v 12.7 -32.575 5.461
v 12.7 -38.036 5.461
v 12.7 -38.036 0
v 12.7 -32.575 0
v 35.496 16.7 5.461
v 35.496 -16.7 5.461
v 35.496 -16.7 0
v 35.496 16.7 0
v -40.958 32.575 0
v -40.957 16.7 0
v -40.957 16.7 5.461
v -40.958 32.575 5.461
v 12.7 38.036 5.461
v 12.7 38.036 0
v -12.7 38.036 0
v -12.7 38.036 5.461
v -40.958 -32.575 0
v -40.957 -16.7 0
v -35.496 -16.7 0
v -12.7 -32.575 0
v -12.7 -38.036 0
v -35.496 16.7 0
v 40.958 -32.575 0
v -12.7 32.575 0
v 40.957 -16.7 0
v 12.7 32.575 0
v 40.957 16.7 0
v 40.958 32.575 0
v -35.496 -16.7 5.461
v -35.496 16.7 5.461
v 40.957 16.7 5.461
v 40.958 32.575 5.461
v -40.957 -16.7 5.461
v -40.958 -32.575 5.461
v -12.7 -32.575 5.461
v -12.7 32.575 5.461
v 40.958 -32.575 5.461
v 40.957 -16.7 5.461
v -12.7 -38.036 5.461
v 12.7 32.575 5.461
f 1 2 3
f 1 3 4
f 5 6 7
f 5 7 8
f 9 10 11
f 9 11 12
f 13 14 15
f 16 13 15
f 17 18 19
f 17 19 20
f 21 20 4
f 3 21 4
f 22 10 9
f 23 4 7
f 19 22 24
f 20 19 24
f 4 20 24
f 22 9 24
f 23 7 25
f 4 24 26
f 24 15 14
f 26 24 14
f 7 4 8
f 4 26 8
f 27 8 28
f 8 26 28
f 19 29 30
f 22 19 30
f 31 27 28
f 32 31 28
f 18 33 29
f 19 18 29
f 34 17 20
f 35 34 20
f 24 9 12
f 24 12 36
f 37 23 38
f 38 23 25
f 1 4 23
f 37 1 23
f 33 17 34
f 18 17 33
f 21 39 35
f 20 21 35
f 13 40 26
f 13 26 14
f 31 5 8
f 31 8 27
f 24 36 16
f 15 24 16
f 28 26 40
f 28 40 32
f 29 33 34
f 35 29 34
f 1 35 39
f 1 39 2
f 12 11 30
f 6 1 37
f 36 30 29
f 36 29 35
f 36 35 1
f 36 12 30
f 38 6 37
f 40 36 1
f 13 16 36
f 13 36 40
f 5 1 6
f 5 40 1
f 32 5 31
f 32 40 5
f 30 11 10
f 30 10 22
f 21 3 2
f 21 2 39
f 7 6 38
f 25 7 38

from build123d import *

# Parameters (mm, degrees)
SKETCH1_W           = 81.915
SKETCH1_H           = 65.151
BOSS_EXTRUDE1_DEPTH = 5.461
SKETCH2_W           = 5.461
SKETCH2_H           = 33.401
CUT_EXTRUDE1_DEPTH  = 6.461
SKETCH5_W           = 25.4
SKETCH5_H           = 5.461
BOSS_EXTRUDE2_DEPTH = 5.461


with BuildPart() as part:
    # Sketch1 → Boss-Extrude1 (new body)
    with BuildSketch(Plane.XY):
        Rectangle(SKETCH1_W, SKETCH1_H)
    extrude(amount=BOSS_EXTRUDE1_DEPTH)

    # Sketch2 → Cut-Extrude1 (cut, through all)
    with BuildSketch(Plane.XY.offset(5.461)):
        with Locations((-38.227, 0)):
            Rectangle(SKETCH2_W, SKETCH2_H)
        with Locations((38.227, 0)):
            Rectangle(SKETCH2_W, SKETCH2_H)
    extrude(amount=-CUT_EXTRUDE1_DEPTH, mode=Mode.SUBTRACT)

    # Sketch5 → Boss-Extrude2 (add)
    with BuildSketch(Plane(origin=(0, 0, 0), x_dir=(-1, 0, 0), z_dir=(0, 0, -1))):
        with Locations((0, 35.306)):
            Rectangle(SKETCH5_W, SKETCH5_H)
        with Locations((0, -35.306)):
            Rectangle(SKETCH5_W, SKETCH5_H)
    extrude(amount=-BOSS_EXTRUDE2_DEPTH)


solid = part.part
